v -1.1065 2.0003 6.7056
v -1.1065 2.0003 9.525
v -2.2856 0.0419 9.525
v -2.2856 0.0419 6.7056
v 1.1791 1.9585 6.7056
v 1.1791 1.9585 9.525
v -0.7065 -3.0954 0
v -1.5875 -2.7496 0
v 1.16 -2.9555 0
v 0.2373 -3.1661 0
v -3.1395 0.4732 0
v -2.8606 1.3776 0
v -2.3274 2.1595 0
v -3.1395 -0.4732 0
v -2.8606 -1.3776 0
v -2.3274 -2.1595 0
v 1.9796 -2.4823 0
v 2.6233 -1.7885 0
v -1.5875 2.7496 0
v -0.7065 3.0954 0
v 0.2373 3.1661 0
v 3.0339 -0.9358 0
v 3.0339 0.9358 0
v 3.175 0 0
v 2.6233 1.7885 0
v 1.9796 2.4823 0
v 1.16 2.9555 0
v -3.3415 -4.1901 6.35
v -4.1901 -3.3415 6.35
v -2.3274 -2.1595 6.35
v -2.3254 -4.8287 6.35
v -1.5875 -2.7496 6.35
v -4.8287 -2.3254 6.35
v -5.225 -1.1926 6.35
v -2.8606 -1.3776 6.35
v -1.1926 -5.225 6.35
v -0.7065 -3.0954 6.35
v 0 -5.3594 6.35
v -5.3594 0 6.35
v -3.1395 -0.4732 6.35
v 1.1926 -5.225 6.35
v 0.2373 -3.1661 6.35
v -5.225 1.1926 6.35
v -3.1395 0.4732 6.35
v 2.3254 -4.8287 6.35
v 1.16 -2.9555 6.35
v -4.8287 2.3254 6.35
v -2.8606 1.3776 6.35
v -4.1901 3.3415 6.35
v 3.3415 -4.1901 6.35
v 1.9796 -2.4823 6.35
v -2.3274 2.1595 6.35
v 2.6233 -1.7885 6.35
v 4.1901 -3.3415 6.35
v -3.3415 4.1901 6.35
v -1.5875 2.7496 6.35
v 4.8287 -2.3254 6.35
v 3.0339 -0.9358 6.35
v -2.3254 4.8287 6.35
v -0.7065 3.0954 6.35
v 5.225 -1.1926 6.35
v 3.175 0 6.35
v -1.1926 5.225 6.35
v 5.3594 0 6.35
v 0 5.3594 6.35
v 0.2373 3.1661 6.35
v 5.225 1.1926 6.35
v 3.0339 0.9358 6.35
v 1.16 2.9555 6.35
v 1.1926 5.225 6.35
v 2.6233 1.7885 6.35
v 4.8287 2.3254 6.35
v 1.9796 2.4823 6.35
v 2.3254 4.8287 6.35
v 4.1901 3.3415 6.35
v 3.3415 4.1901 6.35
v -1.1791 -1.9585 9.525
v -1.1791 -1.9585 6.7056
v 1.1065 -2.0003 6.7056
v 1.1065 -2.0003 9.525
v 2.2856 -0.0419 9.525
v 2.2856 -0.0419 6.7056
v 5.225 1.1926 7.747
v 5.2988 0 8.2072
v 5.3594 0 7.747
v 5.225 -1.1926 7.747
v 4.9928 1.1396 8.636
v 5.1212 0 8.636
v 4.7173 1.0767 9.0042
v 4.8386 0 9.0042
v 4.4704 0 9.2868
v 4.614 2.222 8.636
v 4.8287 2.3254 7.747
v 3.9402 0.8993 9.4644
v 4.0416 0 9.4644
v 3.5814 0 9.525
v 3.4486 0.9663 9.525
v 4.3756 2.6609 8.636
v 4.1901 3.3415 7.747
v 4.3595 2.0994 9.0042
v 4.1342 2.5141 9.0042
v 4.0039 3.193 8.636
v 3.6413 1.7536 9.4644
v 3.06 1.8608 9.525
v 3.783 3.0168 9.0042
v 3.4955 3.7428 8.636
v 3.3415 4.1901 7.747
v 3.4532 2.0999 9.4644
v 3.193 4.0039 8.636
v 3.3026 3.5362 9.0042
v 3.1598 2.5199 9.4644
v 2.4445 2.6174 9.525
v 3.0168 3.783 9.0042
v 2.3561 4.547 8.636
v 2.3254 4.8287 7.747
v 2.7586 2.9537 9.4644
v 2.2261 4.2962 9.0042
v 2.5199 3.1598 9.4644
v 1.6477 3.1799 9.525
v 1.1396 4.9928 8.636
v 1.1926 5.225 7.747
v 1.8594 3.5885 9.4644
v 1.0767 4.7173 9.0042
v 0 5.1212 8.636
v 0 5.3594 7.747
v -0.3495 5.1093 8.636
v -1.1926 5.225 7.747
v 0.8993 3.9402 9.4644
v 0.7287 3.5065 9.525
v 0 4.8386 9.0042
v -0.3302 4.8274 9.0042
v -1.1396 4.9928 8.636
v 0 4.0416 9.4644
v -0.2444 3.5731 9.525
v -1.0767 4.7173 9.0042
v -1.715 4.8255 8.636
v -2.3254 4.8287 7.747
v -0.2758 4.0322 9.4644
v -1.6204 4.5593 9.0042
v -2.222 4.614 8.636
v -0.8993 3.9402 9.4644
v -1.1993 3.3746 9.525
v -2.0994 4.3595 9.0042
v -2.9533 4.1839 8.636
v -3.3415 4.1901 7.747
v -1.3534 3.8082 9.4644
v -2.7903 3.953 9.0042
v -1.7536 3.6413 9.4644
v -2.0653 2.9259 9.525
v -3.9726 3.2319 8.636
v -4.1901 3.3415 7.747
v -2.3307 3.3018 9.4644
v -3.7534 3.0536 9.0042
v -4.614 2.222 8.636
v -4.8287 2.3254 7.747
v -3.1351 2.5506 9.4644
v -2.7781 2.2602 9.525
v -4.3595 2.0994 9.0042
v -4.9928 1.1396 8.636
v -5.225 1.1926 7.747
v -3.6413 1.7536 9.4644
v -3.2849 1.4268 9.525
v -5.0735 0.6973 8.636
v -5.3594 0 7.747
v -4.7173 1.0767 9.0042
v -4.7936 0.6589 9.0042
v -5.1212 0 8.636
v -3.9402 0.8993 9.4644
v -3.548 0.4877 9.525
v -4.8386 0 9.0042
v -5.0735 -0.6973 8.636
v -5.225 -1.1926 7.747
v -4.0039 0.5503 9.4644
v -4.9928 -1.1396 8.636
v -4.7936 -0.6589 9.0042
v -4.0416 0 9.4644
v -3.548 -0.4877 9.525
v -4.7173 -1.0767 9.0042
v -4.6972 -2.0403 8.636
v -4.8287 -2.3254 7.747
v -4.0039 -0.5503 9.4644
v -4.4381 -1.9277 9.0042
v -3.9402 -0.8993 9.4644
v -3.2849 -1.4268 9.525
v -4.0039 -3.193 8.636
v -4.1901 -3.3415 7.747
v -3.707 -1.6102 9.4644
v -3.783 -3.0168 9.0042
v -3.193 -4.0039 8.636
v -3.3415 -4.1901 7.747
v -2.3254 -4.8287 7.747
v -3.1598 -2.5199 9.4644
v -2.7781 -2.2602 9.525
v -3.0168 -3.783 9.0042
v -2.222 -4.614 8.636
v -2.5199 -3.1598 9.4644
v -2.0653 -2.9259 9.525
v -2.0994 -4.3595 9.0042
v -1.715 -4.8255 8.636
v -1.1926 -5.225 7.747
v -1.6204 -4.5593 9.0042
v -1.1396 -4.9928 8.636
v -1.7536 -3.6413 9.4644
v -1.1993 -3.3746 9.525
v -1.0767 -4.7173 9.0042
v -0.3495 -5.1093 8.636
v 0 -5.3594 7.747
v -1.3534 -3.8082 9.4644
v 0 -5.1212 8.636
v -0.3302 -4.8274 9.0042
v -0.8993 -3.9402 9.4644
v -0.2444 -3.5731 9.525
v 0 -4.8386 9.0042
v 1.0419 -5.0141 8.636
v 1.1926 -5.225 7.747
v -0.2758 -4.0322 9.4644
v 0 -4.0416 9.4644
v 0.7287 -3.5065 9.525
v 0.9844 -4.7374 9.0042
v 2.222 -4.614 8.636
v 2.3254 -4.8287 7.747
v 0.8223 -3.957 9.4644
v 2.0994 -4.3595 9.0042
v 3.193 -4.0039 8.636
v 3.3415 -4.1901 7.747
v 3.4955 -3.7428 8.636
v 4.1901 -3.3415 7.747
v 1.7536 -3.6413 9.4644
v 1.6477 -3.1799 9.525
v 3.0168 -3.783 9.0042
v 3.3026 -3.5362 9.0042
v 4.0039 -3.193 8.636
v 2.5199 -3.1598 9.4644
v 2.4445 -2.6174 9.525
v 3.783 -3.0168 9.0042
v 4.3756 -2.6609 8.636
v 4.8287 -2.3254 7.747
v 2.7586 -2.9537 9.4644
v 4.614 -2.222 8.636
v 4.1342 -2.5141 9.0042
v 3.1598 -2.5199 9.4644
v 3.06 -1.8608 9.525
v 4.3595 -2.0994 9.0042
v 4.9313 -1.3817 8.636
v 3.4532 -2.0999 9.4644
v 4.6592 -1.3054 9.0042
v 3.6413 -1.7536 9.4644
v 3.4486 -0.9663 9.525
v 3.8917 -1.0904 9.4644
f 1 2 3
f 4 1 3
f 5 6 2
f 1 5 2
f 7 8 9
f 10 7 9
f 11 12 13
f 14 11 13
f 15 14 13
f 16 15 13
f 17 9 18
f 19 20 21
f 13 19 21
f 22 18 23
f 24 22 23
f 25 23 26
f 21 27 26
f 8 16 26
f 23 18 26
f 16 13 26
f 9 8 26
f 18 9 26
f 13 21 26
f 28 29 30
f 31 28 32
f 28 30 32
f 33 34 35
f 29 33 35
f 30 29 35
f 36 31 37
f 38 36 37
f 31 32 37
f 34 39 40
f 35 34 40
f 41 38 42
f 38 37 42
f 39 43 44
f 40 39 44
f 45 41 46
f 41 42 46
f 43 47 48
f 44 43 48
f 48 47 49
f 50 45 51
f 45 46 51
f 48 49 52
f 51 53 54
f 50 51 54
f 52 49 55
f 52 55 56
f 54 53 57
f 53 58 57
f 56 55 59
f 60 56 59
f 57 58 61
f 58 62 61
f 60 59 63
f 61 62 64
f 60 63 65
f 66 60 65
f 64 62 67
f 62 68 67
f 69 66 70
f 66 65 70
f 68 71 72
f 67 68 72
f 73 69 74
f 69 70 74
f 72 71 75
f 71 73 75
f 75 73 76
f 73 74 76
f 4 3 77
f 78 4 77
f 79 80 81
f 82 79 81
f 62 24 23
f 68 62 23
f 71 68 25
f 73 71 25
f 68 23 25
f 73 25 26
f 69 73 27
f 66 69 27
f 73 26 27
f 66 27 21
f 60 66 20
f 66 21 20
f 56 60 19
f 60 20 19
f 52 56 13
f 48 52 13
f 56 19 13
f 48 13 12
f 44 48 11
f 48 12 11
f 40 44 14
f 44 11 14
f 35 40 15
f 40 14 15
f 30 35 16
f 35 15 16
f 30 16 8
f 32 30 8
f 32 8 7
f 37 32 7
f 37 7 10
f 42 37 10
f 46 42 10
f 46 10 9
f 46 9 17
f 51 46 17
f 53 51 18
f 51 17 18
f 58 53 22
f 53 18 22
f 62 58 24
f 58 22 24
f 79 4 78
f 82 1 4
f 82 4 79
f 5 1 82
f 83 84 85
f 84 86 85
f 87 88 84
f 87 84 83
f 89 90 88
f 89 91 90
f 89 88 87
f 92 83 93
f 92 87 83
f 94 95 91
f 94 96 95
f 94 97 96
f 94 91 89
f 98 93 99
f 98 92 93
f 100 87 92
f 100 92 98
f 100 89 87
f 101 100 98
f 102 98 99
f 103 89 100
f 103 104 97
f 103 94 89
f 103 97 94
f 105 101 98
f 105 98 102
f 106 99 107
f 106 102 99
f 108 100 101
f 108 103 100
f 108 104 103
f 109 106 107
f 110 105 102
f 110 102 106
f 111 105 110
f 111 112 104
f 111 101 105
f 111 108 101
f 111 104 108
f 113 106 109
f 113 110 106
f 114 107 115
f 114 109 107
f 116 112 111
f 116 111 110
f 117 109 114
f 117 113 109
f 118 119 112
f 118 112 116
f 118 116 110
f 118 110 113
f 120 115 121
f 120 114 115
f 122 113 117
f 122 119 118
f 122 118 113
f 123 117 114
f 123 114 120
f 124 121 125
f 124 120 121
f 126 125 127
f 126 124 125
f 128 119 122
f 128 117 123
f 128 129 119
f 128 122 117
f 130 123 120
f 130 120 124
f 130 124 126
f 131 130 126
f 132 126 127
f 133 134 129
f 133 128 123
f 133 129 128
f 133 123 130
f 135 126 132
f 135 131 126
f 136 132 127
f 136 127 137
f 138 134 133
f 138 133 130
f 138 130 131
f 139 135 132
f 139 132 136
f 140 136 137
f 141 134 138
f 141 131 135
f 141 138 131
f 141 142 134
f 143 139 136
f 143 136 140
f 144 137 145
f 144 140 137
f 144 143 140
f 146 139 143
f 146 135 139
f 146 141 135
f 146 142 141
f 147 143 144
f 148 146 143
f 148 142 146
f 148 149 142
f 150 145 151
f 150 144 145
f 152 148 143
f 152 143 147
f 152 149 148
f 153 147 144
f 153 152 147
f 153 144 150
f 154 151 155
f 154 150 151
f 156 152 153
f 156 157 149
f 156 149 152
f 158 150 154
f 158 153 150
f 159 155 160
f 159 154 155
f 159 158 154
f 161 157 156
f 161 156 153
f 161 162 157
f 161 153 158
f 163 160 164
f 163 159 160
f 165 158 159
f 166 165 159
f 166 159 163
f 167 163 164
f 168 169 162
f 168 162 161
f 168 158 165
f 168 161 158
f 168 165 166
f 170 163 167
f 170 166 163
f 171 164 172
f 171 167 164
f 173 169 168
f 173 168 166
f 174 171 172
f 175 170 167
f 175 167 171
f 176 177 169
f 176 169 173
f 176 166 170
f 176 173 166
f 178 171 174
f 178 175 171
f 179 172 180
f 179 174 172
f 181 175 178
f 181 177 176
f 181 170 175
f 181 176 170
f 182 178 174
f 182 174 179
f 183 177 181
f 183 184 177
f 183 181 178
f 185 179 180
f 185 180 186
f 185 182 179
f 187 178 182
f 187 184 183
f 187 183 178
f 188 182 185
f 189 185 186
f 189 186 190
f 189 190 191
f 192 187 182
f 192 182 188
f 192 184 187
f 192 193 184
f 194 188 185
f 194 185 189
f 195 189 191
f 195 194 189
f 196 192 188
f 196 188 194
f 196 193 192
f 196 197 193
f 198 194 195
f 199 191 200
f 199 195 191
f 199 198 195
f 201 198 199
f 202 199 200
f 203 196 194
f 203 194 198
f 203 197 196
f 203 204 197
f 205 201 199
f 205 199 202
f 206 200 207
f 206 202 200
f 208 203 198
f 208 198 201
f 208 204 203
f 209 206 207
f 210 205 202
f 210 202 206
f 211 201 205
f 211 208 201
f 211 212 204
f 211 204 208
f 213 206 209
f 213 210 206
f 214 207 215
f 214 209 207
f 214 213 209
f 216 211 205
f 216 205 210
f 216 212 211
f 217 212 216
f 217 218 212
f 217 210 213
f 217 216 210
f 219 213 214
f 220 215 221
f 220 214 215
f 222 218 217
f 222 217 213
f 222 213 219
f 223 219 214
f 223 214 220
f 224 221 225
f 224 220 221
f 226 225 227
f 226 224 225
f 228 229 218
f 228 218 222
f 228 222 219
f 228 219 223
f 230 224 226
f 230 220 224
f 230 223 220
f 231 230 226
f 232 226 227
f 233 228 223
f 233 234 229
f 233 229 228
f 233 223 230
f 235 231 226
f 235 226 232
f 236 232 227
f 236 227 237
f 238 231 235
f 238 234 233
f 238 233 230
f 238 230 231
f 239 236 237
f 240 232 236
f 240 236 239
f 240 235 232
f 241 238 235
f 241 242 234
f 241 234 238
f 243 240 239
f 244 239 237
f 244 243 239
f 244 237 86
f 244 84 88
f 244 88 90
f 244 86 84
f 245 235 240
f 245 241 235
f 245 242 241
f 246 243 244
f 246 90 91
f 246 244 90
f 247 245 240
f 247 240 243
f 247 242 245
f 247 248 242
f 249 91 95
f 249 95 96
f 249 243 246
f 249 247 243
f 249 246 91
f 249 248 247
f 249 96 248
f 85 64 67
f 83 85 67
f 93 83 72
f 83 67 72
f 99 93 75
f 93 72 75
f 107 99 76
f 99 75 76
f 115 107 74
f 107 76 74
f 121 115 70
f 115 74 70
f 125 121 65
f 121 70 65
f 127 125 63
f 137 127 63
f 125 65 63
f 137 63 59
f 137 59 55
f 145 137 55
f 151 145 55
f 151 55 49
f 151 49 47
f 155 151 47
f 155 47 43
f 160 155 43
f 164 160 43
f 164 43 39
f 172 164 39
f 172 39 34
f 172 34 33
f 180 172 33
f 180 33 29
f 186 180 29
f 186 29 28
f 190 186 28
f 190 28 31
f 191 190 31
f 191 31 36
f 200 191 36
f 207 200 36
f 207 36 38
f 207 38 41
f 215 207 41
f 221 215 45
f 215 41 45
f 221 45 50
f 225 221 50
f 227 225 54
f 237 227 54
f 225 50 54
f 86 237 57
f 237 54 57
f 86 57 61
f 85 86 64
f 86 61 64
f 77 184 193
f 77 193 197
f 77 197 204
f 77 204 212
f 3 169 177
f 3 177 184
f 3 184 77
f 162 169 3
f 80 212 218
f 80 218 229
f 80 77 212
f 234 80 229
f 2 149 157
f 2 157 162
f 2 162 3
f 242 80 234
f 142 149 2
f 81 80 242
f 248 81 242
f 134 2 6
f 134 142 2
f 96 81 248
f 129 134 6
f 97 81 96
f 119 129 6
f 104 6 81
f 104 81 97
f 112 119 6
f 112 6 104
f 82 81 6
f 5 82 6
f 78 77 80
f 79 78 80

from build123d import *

# Parameters (mm, degrees)
F0_R     = 3.175
F1_DEPTH = 6.35
F2_R     = 5.3594
F3_DEPTH = 0.7874
F4_R     = 5.3594
F5_DEPTH = 2.3876
F6_R     = 1.778
F8_DEPTH = 2.8194


with BuildPart() as f1:
    # F0 (on Top) → F1 (new body)
    with BuildSketch(Plane.XY):
        Circle(F0_R)
    extrude(amount=F1_DEPTH)

    # F2 (on face) → F3 (join)
    with BuildSketch(Plane.XY.offset(6.35)):
        Circle(F2_R)
    extrude(amount=F3_DEPTH)

    # F4 (on face) → F5 (join)
    with BuildSketch(Plane.XY.offset(7.1374)):
        Circle(F4_R)
    extrude(amount=F5_DEPTH)

    # F6
    f6_edges = [f1.edges().sort_by_distance(p)[0] for p in [
        (-5.3594, 0, 9.525),
    ]]
    fillet(f6_edges, radius=F6_R)

    # F7 (on face) → F8 (cut)
    with BuildSketch(Plane.XY.offset(9.525)):
        Polygon((1.1065416167, -2.0003403837), (2.2856163968, -0.0418770414), (1.1790747801, 1.9584633423), (-1.1065416167, 2.0003403837), (-2.2856163968, 0.0418770414), (-1.1790747801, -1.9584633423), align=None)
    extrude(amount=-F8_DEPTH, mode=Mode.SUBTRACT)


solid = f1.part
